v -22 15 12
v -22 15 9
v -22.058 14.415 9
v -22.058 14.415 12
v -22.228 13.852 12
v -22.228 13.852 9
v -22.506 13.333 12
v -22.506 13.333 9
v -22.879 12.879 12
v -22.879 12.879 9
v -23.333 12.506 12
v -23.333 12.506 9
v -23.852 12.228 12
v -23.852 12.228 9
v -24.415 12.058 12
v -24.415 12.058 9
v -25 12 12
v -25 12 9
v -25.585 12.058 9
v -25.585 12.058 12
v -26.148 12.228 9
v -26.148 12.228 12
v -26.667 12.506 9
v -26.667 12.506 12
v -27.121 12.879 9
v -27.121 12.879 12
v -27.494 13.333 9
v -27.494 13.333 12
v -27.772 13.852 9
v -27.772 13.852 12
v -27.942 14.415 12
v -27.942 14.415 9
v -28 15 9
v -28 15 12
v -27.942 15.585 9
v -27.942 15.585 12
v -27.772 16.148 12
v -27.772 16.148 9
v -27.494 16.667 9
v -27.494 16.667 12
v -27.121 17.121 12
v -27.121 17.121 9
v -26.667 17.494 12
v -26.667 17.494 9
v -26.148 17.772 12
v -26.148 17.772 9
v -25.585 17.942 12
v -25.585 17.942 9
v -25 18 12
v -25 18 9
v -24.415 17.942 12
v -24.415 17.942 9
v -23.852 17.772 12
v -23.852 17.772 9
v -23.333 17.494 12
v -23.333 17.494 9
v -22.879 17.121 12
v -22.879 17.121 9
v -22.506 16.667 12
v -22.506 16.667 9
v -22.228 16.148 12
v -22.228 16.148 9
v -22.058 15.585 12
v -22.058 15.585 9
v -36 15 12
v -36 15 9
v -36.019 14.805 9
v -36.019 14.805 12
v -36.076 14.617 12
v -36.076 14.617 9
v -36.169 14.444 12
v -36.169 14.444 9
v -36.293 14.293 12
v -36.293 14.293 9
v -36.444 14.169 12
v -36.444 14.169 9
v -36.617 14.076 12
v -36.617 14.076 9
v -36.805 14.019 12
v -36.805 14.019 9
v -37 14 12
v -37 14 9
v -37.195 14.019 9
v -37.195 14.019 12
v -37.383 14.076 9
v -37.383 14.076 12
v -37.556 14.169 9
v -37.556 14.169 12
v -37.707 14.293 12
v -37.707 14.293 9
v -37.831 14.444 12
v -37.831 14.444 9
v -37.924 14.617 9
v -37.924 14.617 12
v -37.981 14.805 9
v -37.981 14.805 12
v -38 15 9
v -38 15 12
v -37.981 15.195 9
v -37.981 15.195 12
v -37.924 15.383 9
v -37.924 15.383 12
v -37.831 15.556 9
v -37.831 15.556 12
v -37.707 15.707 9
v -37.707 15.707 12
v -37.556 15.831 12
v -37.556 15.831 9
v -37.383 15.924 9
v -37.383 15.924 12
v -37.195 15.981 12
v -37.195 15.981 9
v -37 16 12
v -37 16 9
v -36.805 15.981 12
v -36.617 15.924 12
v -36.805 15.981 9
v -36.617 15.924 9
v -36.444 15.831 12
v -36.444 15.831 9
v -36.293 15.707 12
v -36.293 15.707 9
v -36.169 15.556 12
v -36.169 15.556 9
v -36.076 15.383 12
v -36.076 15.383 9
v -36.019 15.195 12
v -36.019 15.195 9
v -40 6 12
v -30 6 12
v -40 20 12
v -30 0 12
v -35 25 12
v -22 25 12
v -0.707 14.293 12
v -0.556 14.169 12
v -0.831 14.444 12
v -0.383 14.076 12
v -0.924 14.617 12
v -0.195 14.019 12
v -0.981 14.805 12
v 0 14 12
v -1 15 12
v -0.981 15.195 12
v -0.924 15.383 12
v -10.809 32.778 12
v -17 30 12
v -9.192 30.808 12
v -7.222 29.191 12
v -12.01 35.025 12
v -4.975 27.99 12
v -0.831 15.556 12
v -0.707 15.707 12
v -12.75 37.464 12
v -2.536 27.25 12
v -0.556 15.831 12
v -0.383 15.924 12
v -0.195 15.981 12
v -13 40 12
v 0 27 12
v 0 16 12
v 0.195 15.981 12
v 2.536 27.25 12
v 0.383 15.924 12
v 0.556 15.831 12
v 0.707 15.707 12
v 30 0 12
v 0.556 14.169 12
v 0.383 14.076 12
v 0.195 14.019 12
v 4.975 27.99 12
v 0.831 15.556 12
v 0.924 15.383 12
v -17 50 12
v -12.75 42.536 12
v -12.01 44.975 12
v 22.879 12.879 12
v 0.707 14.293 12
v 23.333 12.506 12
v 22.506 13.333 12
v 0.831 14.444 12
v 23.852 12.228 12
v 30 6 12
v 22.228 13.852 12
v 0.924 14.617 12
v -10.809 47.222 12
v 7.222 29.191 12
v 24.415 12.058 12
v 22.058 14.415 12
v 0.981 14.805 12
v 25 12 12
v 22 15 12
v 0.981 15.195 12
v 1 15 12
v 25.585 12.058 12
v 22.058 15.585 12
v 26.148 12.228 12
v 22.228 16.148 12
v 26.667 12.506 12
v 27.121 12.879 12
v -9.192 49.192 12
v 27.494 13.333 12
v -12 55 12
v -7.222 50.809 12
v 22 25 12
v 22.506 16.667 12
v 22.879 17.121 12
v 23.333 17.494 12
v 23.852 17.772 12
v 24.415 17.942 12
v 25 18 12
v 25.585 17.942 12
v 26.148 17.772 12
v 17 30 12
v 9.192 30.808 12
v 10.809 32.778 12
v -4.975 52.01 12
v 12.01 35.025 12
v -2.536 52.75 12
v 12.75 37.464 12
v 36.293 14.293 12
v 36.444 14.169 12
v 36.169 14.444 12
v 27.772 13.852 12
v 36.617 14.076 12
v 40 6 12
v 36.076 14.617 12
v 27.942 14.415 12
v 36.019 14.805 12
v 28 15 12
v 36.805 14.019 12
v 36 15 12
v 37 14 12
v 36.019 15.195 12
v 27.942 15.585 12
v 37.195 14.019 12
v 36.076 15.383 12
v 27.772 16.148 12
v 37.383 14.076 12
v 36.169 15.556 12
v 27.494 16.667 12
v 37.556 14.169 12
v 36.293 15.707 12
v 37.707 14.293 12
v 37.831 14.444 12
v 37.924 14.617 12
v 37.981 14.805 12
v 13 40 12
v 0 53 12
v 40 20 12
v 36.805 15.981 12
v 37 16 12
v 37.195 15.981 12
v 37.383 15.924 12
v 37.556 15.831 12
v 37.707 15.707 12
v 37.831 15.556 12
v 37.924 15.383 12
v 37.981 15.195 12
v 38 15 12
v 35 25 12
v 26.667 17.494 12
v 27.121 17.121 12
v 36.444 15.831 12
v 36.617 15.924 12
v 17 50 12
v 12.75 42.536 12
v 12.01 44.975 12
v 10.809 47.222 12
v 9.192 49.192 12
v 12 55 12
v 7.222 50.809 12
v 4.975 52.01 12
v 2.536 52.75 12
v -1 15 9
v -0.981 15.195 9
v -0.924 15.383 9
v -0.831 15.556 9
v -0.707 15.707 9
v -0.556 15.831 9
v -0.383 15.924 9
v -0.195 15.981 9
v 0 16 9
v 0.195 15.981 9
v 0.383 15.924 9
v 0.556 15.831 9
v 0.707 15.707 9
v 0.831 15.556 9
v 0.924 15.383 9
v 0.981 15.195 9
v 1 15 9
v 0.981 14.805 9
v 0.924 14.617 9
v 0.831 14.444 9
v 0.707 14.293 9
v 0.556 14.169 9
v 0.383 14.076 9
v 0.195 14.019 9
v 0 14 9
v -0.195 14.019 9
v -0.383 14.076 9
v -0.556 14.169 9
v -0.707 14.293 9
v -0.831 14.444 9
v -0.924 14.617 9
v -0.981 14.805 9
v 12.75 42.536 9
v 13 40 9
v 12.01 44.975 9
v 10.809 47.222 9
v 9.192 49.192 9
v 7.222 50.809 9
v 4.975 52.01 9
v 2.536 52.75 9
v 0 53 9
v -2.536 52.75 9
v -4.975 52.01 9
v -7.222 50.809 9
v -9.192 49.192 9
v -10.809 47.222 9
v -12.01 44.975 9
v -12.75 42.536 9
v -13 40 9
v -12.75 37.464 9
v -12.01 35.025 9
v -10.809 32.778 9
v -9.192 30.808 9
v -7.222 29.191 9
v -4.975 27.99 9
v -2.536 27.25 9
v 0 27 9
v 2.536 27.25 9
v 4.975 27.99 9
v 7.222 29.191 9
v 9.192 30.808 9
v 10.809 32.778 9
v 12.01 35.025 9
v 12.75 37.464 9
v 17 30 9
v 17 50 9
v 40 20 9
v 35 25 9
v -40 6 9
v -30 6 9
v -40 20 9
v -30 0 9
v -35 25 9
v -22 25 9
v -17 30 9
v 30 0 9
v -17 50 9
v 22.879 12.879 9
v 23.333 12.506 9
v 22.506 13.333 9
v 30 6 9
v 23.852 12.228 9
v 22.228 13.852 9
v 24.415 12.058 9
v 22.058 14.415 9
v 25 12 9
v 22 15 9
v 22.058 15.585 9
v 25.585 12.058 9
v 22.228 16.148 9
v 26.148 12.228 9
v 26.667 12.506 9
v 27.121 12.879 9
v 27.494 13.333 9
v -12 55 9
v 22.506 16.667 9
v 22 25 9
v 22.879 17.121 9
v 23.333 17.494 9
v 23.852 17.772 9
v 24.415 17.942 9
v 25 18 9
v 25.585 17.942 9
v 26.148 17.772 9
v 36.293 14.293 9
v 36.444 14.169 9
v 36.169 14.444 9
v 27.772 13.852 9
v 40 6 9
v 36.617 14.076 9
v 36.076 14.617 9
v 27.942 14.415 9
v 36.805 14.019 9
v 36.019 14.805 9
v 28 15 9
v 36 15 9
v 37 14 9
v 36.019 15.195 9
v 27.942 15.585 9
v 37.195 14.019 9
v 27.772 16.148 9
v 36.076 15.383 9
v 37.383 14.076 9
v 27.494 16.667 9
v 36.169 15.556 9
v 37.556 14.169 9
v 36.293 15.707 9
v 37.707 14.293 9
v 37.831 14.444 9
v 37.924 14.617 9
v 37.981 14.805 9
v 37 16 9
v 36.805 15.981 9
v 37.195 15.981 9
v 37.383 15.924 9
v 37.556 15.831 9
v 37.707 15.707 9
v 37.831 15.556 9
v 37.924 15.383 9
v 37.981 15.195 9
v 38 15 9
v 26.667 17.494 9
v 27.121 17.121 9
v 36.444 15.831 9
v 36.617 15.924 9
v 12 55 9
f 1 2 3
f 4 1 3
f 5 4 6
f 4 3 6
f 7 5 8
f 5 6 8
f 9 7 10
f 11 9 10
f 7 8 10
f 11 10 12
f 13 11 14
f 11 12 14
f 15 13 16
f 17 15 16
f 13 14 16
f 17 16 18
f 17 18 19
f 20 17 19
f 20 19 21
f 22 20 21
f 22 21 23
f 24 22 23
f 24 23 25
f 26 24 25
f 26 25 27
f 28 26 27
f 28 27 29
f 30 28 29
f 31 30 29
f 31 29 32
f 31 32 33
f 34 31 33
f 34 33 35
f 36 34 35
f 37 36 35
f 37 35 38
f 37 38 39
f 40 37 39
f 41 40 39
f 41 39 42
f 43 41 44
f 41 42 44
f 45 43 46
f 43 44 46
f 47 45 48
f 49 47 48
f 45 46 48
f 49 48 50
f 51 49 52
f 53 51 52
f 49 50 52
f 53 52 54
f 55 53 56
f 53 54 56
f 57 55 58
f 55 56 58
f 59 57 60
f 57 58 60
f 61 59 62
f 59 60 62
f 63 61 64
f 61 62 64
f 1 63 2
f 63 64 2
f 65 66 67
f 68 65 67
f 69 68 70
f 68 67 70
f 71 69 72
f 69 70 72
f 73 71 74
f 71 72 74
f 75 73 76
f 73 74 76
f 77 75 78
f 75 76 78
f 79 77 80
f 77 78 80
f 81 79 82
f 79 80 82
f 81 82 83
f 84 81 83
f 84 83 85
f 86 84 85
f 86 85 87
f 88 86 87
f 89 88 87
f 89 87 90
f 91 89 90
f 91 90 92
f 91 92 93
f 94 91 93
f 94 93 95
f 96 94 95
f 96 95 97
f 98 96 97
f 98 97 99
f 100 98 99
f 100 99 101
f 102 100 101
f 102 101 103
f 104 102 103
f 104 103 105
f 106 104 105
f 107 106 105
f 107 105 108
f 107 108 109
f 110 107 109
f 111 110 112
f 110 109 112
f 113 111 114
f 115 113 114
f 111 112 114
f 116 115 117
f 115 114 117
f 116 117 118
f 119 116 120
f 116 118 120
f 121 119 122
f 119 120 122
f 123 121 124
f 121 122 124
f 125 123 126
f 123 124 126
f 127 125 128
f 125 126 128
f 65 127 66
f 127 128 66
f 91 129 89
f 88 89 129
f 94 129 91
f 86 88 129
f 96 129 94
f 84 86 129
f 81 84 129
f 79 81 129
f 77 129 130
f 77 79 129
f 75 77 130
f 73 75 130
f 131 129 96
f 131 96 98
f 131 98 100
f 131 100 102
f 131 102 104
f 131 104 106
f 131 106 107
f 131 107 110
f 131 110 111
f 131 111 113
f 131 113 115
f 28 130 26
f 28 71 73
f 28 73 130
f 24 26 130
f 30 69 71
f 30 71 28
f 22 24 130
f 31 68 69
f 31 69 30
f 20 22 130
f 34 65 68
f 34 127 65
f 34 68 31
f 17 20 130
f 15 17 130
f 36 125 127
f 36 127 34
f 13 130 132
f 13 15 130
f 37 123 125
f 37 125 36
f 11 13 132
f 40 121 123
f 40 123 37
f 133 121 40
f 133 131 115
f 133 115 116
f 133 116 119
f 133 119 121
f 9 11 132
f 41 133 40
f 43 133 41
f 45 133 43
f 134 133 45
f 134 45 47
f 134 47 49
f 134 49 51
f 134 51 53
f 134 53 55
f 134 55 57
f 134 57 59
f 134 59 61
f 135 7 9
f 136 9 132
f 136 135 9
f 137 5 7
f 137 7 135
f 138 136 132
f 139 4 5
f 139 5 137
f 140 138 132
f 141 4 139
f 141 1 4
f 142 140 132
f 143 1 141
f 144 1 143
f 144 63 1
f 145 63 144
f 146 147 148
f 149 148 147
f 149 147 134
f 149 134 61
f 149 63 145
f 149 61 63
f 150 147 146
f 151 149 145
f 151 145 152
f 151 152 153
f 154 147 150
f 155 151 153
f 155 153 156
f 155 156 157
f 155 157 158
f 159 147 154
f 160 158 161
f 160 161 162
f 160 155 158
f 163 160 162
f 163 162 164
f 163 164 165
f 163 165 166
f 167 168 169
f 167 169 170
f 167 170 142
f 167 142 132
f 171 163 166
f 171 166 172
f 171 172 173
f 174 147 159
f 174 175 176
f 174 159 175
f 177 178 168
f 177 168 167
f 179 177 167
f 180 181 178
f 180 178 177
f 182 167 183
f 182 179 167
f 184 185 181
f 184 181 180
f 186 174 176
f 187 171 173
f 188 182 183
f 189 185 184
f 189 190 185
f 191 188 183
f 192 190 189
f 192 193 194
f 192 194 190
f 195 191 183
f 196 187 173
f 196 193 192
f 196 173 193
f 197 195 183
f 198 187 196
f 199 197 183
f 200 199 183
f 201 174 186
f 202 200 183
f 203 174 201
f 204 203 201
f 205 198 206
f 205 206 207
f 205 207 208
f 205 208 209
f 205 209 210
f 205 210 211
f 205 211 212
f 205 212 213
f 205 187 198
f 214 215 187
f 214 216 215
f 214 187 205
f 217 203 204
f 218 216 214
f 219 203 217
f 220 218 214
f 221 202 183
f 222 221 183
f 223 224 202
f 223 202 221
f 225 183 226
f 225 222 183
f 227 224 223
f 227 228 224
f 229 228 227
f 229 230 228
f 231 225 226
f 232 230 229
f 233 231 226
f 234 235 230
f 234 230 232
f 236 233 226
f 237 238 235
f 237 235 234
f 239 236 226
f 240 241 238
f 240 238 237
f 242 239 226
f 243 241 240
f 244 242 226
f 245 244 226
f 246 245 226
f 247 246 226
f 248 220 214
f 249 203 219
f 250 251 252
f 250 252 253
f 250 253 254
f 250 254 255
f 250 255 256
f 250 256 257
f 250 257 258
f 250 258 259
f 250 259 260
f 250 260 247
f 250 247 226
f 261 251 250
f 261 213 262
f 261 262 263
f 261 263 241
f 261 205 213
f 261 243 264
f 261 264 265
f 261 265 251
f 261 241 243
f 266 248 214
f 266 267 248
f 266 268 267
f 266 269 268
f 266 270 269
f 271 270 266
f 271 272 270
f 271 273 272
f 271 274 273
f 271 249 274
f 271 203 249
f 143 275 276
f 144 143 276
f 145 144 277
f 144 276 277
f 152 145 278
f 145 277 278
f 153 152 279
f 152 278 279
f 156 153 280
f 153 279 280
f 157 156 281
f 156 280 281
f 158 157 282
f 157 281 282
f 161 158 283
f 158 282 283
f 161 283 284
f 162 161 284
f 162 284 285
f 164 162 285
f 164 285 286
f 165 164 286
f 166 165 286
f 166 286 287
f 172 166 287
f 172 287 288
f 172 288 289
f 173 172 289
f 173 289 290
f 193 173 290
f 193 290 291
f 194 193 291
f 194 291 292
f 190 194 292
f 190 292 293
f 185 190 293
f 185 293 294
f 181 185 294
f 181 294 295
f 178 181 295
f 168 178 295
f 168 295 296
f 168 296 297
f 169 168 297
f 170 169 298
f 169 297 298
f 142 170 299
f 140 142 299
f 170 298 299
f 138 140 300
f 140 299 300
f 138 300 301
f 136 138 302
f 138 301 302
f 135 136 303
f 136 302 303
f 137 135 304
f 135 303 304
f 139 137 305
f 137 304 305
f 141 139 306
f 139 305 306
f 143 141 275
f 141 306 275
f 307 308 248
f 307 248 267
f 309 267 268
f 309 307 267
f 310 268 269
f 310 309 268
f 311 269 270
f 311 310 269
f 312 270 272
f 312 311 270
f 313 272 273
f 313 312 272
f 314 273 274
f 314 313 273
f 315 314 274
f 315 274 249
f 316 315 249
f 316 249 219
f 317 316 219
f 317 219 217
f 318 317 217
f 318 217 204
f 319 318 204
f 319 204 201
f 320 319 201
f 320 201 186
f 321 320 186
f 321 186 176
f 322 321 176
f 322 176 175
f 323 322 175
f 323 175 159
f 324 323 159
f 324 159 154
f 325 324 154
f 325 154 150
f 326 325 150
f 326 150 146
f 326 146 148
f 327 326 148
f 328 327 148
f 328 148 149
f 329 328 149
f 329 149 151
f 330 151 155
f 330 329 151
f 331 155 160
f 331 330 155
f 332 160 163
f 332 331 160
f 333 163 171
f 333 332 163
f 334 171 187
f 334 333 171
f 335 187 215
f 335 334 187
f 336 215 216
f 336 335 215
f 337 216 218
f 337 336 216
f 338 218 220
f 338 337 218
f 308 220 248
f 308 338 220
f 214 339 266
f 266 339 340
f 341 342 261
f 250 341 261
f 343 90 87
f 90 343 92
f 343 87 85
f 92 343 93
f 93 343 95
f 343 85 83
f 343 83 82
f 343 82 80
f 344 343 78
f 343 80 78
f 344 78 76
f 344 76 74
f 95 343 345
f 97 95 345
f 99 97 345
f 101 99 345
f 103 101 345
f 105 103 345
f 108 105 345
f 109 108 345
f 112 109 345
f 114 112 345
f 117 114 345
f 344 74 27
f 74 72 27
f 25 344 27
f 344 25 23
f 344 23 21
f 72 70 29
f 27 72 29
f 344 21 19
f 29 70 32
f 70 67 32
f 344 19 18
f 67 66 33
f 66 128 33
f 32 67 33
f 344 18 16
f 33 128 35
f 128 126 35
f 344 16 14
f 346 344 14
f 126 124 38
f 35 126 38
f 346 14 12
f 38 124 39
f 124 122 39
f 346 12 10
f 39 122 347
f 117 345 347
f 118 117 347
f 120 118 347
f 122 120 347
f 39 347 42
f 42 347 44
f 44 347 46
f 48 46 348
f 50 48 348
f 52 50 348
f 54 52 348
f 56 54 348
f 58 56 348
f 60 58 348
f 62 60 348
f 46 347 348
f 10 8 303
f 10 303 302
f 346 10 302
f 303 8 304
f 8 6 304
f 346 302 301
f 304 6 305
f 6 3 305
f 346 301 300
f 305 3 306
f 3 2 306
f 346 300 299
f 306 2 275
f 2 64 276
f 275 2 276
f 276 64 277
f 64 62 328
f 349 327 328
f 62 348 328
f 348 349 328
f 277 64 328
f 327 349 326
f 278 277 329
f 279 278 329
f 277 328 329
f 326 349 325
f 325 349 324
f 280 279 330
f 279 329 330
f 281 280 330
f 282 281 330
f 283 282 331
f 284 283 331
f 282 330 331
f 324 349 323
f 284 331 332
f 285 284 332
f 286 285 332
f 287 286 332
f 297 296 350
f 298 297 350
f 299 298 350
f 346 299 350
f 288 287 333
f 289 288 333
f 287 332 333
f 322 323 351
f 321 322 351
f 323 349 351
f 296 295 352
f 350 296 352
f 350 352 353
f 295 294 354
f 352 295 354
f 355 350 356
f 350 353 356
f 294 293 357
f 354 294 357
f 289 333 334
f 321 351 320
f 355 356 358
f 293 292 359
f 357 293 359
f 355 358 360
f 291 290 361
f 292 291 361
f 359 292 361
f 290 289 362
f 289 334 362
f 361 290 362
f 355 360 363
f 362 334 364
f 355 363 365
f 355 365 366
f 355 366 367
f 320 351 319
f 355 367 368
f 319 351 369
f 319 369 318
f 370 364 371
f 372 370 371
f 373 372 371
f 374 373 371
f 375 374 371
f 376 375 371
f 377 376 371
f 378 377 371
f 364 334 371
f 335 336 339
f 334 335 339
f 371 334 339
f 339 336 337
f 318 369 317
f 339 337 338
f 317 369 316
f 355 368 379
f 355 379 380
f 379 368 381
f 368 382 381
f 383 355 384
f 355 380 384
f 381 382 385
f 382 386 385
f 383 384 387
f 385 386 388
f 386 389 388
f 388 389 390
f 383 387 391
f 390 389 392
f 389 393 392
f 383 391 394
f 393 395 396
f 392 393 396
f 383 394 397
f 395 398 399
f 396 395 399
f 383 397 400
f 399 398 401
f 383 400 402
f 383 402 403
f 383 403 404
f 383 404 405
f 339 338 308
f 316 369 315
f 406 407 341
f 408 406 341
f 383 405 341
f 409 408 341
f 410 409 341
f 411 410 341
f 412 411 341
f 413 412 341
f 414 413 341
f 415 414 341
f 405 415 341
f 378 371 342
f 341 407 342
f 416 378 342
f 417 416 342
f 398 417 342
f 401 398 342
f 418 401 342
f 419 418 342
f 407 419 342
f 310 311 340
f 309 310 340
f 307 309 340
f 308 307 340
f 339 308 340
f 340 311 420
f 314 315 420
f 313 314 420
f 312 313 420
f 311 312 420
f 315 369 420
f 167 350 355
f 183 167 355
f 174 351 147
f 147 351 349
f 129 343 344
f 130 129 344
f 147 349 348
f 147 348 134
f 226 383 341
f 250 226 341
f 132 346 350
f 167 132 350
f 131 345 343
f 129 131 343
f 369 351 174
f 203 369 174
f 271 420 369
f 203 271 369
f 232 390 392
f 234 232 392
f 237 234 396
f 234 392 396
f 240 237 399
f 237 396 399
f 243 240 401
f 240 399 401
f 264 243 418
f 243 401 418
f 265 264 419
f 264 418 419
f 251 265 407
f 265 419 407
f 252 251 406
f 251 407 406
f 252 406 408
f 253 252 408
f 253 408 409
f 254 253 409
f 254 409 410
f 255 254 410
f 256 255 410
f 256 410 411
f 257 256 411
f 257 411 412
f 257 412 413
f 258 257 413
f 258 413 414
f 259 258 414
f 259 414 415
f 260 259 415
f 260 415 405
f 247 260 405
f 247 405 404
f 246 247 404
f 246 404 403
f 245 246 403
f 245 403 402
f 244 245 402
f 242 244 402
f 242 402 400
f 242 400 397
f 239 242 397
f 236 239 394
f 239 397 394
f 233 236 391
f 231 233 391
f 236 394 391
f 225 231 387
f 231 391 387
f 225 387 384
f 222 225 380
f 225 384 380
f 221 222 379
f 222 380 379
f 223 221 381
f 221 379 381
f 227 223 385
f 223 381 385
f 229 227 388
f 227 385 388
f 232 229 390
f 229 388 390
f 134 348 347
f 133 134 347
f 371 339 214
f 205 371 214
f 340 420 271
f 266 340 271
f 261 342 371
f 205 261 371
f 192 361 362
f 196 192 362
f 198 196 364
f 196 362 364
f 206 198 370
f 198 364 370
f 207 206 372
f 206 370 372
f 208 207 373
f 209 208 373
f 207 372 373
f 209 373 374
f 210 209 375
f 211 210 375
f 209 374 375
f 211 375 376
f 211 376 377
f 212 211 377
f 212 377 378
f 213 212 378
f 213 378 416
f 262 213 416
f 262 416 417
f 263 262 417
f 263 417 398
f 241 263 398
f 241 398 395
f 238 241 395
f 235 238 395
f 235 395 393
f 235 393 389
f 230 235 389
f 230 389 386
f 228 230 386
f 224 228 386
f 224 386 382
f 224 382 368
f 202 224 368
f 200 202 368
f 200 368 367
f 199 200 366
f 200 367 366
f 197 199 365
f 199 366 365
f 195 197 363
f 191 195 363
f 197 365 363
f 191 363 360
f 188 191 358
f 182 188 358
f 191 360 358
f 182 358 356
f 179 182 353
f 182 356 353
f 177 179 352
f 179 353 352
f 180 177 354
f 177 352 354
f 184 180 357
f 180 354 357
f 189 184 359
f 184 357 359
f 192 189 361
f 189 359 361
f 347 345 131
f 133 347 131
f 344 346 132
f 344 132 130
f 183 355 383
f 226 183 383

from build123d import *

# Parameters (mm, degrees)
ESQUISSE1_R             = 13
BOSS_EXTRU_1_DEPTH      = 12
BOSS_EXTRU_2_START      = -12
ESQUISSE2_R             = 13
ESQUISSE2_R_2           = 5.5
BOSS_EXTRU_2_DEPTH      = 3
ESQUISSE4_R             = 8
ENL_V_MAT_EXTRU_2_DEPTH = 6
ESQUISSE5_R             = 3
ENL_V_MAT_EXTRU_3_DEPTH = 69.271516755
ENL_V_START             = -12
ESQUISSE6_W             = 10
ESQUISSE6_H             = 6
ENL_V_MAT_EXTRU_4_DEPTH = 12
CHANFREIN1_SIZE         = 5
ESQUISSE7_R             = 1
ENL_V_MAT_EXTRU_5_DEPTH = 12
ESQUISSE8_W             = 80
ESQUISSE8_H             = 9
ENL_V_MAT_EXTRU_6_DEPTH = 70.057946682


with BuildPart() as part:
    # Esquisse1 → Boss.-Extru.1 (new body)
    with BuildSketch(Plane.XY):
        Polygon((-40, 0), (40, 0), (40, 25), (17, 25), (17, 55), (-17, 55), (-17, 25), (-40, 25), align=None)
        with Locations((0, 40)):
            Circle(ESQUISSE1_R, mode=Mode.SUBTRACT)
    extrude(amount=BOSS_EXTRU_1_DEPTH)

    # Esquisse2 → Boss.-Extru.2 (add)
    with BuildSketch(Plane.XY.offset(12).offset(BOSS_EXTRU_2_START)):
        with Locations((0, 40)):
            Circle(ESQUISSE2_R)
        with Locations((0, 40)):
            Circle(ESQUISSE2_R_2, mode=Mode.SUBTRACT)
    extrude(amount=BOSS_EXTRU_2_DEPTH)

    # Esquisse4 → Enlèv. mat.-Extru.2 (cut)
    with BuildSketch(Plane(origin=(0, 0, 0), x_dir=(-1, 0, 0), z_dir=(0, 0, -1))):
        with Locations((-25, 15)):
            Circle(ESQUISSE4_R)
        with Locations(Location((25, 15, 0), (0, 0, 180))):
            Circle(ESQUISSE4_R)
    extrude(amount=-ENL_V_MAT_EXTRU_2_DEPTH, mode=Mode.SUBTRACT)

    # Esquisse5 → Enlèv. mat.-Extru.3 (cut, through all)
    with BuildSketch(Plane(origin=(0, 0, 6), x_dir=(-1, 0, 0), z_dir=(0, 0, -1))):
        with Locations((-25, 15)):
            Circle(ESQUISSE5_R)
        with Locations(Location((25, 15, 0), (0, 0, 180))):
            Circle(ESQUISSE5_R)
    extrude(amount=-ENL_V_MAT_EXTRU_3_DEPTH, mode=Mode.SUBTRACT)

    # Esquisse6 → Enlèv. mat.-Extru.4 (cut)
    with BuildSketch(Plane.XY.offset(12).offset(ENL_V_START)):
        with Locations((35, 3)):
            Rectangle(ESQUISSE6_W, ESQUISSE6_H)
        with Locations((-35, 3)):
            Rectangle(ESQUISSE6_W, ESQUISSE6_H)
    extrude(amount=ENL_V_MAT_EXTRU_4_DEPTH, mode=Mode.SUBTRACT)

    # Chanfrein1
    chanfrein1_edges = [part.edges().sort_by_distance(p)[0] for p in [
        (-17, 55, 6),
        (17, 55, 6),
        (17, 25, 6),
        (40, 25, 6),
        (-40, 25, 6),
        (-17, 25, 6),
    ]]
    chamfer(chanfrein1_edges, length=CHANFREIN1_SIZE)

    # Esquisse7 → Enlèv. mat.-Extru.5 (cut)
    with BuildSketch(Plane(origin=(0, 0, 0), x_dir=(-1, 0, 0), z_dir=(0, 0, -1))):
        with Locations((-10, 45)):
            Circle(ESQUISSE7_R)
        with Locations(Location((10, 45, 0), (0, 0, 180))):
            Circle(ESQUISSE7_R)
        with Locations((-37, 15)):
            Circle(ESQUISSE7_R)
        with Locations(Location((37, 15, 0), (0, 0, 180))):
            Circle(ESQUISSE7_R)
        with Locations((0, 15)):
            Circle(ESQUISSE7_R)
    extrude(amount=-ENL_V_MAT_EXTRU_5_DEPTH, mode=Mode.SUBTRACT)

    # Esquisse8 → Enlèv. mat.-Extru.6 (cut, through all)
    with BuildSketch(Plane(origin=(0, 55, 0), x_dir=(1, 0, 0), z_dir=(0, 1, 0))):
        with Locations((0, -4.5)):
            Rectangle(ESQUISSE8_W, ESQUISSE8_H)
    extrude(amount=-ENL_V_MAT_EXTRU_6_DEPTH, mode=Mode.SUBTRACT)


solid = part.part
